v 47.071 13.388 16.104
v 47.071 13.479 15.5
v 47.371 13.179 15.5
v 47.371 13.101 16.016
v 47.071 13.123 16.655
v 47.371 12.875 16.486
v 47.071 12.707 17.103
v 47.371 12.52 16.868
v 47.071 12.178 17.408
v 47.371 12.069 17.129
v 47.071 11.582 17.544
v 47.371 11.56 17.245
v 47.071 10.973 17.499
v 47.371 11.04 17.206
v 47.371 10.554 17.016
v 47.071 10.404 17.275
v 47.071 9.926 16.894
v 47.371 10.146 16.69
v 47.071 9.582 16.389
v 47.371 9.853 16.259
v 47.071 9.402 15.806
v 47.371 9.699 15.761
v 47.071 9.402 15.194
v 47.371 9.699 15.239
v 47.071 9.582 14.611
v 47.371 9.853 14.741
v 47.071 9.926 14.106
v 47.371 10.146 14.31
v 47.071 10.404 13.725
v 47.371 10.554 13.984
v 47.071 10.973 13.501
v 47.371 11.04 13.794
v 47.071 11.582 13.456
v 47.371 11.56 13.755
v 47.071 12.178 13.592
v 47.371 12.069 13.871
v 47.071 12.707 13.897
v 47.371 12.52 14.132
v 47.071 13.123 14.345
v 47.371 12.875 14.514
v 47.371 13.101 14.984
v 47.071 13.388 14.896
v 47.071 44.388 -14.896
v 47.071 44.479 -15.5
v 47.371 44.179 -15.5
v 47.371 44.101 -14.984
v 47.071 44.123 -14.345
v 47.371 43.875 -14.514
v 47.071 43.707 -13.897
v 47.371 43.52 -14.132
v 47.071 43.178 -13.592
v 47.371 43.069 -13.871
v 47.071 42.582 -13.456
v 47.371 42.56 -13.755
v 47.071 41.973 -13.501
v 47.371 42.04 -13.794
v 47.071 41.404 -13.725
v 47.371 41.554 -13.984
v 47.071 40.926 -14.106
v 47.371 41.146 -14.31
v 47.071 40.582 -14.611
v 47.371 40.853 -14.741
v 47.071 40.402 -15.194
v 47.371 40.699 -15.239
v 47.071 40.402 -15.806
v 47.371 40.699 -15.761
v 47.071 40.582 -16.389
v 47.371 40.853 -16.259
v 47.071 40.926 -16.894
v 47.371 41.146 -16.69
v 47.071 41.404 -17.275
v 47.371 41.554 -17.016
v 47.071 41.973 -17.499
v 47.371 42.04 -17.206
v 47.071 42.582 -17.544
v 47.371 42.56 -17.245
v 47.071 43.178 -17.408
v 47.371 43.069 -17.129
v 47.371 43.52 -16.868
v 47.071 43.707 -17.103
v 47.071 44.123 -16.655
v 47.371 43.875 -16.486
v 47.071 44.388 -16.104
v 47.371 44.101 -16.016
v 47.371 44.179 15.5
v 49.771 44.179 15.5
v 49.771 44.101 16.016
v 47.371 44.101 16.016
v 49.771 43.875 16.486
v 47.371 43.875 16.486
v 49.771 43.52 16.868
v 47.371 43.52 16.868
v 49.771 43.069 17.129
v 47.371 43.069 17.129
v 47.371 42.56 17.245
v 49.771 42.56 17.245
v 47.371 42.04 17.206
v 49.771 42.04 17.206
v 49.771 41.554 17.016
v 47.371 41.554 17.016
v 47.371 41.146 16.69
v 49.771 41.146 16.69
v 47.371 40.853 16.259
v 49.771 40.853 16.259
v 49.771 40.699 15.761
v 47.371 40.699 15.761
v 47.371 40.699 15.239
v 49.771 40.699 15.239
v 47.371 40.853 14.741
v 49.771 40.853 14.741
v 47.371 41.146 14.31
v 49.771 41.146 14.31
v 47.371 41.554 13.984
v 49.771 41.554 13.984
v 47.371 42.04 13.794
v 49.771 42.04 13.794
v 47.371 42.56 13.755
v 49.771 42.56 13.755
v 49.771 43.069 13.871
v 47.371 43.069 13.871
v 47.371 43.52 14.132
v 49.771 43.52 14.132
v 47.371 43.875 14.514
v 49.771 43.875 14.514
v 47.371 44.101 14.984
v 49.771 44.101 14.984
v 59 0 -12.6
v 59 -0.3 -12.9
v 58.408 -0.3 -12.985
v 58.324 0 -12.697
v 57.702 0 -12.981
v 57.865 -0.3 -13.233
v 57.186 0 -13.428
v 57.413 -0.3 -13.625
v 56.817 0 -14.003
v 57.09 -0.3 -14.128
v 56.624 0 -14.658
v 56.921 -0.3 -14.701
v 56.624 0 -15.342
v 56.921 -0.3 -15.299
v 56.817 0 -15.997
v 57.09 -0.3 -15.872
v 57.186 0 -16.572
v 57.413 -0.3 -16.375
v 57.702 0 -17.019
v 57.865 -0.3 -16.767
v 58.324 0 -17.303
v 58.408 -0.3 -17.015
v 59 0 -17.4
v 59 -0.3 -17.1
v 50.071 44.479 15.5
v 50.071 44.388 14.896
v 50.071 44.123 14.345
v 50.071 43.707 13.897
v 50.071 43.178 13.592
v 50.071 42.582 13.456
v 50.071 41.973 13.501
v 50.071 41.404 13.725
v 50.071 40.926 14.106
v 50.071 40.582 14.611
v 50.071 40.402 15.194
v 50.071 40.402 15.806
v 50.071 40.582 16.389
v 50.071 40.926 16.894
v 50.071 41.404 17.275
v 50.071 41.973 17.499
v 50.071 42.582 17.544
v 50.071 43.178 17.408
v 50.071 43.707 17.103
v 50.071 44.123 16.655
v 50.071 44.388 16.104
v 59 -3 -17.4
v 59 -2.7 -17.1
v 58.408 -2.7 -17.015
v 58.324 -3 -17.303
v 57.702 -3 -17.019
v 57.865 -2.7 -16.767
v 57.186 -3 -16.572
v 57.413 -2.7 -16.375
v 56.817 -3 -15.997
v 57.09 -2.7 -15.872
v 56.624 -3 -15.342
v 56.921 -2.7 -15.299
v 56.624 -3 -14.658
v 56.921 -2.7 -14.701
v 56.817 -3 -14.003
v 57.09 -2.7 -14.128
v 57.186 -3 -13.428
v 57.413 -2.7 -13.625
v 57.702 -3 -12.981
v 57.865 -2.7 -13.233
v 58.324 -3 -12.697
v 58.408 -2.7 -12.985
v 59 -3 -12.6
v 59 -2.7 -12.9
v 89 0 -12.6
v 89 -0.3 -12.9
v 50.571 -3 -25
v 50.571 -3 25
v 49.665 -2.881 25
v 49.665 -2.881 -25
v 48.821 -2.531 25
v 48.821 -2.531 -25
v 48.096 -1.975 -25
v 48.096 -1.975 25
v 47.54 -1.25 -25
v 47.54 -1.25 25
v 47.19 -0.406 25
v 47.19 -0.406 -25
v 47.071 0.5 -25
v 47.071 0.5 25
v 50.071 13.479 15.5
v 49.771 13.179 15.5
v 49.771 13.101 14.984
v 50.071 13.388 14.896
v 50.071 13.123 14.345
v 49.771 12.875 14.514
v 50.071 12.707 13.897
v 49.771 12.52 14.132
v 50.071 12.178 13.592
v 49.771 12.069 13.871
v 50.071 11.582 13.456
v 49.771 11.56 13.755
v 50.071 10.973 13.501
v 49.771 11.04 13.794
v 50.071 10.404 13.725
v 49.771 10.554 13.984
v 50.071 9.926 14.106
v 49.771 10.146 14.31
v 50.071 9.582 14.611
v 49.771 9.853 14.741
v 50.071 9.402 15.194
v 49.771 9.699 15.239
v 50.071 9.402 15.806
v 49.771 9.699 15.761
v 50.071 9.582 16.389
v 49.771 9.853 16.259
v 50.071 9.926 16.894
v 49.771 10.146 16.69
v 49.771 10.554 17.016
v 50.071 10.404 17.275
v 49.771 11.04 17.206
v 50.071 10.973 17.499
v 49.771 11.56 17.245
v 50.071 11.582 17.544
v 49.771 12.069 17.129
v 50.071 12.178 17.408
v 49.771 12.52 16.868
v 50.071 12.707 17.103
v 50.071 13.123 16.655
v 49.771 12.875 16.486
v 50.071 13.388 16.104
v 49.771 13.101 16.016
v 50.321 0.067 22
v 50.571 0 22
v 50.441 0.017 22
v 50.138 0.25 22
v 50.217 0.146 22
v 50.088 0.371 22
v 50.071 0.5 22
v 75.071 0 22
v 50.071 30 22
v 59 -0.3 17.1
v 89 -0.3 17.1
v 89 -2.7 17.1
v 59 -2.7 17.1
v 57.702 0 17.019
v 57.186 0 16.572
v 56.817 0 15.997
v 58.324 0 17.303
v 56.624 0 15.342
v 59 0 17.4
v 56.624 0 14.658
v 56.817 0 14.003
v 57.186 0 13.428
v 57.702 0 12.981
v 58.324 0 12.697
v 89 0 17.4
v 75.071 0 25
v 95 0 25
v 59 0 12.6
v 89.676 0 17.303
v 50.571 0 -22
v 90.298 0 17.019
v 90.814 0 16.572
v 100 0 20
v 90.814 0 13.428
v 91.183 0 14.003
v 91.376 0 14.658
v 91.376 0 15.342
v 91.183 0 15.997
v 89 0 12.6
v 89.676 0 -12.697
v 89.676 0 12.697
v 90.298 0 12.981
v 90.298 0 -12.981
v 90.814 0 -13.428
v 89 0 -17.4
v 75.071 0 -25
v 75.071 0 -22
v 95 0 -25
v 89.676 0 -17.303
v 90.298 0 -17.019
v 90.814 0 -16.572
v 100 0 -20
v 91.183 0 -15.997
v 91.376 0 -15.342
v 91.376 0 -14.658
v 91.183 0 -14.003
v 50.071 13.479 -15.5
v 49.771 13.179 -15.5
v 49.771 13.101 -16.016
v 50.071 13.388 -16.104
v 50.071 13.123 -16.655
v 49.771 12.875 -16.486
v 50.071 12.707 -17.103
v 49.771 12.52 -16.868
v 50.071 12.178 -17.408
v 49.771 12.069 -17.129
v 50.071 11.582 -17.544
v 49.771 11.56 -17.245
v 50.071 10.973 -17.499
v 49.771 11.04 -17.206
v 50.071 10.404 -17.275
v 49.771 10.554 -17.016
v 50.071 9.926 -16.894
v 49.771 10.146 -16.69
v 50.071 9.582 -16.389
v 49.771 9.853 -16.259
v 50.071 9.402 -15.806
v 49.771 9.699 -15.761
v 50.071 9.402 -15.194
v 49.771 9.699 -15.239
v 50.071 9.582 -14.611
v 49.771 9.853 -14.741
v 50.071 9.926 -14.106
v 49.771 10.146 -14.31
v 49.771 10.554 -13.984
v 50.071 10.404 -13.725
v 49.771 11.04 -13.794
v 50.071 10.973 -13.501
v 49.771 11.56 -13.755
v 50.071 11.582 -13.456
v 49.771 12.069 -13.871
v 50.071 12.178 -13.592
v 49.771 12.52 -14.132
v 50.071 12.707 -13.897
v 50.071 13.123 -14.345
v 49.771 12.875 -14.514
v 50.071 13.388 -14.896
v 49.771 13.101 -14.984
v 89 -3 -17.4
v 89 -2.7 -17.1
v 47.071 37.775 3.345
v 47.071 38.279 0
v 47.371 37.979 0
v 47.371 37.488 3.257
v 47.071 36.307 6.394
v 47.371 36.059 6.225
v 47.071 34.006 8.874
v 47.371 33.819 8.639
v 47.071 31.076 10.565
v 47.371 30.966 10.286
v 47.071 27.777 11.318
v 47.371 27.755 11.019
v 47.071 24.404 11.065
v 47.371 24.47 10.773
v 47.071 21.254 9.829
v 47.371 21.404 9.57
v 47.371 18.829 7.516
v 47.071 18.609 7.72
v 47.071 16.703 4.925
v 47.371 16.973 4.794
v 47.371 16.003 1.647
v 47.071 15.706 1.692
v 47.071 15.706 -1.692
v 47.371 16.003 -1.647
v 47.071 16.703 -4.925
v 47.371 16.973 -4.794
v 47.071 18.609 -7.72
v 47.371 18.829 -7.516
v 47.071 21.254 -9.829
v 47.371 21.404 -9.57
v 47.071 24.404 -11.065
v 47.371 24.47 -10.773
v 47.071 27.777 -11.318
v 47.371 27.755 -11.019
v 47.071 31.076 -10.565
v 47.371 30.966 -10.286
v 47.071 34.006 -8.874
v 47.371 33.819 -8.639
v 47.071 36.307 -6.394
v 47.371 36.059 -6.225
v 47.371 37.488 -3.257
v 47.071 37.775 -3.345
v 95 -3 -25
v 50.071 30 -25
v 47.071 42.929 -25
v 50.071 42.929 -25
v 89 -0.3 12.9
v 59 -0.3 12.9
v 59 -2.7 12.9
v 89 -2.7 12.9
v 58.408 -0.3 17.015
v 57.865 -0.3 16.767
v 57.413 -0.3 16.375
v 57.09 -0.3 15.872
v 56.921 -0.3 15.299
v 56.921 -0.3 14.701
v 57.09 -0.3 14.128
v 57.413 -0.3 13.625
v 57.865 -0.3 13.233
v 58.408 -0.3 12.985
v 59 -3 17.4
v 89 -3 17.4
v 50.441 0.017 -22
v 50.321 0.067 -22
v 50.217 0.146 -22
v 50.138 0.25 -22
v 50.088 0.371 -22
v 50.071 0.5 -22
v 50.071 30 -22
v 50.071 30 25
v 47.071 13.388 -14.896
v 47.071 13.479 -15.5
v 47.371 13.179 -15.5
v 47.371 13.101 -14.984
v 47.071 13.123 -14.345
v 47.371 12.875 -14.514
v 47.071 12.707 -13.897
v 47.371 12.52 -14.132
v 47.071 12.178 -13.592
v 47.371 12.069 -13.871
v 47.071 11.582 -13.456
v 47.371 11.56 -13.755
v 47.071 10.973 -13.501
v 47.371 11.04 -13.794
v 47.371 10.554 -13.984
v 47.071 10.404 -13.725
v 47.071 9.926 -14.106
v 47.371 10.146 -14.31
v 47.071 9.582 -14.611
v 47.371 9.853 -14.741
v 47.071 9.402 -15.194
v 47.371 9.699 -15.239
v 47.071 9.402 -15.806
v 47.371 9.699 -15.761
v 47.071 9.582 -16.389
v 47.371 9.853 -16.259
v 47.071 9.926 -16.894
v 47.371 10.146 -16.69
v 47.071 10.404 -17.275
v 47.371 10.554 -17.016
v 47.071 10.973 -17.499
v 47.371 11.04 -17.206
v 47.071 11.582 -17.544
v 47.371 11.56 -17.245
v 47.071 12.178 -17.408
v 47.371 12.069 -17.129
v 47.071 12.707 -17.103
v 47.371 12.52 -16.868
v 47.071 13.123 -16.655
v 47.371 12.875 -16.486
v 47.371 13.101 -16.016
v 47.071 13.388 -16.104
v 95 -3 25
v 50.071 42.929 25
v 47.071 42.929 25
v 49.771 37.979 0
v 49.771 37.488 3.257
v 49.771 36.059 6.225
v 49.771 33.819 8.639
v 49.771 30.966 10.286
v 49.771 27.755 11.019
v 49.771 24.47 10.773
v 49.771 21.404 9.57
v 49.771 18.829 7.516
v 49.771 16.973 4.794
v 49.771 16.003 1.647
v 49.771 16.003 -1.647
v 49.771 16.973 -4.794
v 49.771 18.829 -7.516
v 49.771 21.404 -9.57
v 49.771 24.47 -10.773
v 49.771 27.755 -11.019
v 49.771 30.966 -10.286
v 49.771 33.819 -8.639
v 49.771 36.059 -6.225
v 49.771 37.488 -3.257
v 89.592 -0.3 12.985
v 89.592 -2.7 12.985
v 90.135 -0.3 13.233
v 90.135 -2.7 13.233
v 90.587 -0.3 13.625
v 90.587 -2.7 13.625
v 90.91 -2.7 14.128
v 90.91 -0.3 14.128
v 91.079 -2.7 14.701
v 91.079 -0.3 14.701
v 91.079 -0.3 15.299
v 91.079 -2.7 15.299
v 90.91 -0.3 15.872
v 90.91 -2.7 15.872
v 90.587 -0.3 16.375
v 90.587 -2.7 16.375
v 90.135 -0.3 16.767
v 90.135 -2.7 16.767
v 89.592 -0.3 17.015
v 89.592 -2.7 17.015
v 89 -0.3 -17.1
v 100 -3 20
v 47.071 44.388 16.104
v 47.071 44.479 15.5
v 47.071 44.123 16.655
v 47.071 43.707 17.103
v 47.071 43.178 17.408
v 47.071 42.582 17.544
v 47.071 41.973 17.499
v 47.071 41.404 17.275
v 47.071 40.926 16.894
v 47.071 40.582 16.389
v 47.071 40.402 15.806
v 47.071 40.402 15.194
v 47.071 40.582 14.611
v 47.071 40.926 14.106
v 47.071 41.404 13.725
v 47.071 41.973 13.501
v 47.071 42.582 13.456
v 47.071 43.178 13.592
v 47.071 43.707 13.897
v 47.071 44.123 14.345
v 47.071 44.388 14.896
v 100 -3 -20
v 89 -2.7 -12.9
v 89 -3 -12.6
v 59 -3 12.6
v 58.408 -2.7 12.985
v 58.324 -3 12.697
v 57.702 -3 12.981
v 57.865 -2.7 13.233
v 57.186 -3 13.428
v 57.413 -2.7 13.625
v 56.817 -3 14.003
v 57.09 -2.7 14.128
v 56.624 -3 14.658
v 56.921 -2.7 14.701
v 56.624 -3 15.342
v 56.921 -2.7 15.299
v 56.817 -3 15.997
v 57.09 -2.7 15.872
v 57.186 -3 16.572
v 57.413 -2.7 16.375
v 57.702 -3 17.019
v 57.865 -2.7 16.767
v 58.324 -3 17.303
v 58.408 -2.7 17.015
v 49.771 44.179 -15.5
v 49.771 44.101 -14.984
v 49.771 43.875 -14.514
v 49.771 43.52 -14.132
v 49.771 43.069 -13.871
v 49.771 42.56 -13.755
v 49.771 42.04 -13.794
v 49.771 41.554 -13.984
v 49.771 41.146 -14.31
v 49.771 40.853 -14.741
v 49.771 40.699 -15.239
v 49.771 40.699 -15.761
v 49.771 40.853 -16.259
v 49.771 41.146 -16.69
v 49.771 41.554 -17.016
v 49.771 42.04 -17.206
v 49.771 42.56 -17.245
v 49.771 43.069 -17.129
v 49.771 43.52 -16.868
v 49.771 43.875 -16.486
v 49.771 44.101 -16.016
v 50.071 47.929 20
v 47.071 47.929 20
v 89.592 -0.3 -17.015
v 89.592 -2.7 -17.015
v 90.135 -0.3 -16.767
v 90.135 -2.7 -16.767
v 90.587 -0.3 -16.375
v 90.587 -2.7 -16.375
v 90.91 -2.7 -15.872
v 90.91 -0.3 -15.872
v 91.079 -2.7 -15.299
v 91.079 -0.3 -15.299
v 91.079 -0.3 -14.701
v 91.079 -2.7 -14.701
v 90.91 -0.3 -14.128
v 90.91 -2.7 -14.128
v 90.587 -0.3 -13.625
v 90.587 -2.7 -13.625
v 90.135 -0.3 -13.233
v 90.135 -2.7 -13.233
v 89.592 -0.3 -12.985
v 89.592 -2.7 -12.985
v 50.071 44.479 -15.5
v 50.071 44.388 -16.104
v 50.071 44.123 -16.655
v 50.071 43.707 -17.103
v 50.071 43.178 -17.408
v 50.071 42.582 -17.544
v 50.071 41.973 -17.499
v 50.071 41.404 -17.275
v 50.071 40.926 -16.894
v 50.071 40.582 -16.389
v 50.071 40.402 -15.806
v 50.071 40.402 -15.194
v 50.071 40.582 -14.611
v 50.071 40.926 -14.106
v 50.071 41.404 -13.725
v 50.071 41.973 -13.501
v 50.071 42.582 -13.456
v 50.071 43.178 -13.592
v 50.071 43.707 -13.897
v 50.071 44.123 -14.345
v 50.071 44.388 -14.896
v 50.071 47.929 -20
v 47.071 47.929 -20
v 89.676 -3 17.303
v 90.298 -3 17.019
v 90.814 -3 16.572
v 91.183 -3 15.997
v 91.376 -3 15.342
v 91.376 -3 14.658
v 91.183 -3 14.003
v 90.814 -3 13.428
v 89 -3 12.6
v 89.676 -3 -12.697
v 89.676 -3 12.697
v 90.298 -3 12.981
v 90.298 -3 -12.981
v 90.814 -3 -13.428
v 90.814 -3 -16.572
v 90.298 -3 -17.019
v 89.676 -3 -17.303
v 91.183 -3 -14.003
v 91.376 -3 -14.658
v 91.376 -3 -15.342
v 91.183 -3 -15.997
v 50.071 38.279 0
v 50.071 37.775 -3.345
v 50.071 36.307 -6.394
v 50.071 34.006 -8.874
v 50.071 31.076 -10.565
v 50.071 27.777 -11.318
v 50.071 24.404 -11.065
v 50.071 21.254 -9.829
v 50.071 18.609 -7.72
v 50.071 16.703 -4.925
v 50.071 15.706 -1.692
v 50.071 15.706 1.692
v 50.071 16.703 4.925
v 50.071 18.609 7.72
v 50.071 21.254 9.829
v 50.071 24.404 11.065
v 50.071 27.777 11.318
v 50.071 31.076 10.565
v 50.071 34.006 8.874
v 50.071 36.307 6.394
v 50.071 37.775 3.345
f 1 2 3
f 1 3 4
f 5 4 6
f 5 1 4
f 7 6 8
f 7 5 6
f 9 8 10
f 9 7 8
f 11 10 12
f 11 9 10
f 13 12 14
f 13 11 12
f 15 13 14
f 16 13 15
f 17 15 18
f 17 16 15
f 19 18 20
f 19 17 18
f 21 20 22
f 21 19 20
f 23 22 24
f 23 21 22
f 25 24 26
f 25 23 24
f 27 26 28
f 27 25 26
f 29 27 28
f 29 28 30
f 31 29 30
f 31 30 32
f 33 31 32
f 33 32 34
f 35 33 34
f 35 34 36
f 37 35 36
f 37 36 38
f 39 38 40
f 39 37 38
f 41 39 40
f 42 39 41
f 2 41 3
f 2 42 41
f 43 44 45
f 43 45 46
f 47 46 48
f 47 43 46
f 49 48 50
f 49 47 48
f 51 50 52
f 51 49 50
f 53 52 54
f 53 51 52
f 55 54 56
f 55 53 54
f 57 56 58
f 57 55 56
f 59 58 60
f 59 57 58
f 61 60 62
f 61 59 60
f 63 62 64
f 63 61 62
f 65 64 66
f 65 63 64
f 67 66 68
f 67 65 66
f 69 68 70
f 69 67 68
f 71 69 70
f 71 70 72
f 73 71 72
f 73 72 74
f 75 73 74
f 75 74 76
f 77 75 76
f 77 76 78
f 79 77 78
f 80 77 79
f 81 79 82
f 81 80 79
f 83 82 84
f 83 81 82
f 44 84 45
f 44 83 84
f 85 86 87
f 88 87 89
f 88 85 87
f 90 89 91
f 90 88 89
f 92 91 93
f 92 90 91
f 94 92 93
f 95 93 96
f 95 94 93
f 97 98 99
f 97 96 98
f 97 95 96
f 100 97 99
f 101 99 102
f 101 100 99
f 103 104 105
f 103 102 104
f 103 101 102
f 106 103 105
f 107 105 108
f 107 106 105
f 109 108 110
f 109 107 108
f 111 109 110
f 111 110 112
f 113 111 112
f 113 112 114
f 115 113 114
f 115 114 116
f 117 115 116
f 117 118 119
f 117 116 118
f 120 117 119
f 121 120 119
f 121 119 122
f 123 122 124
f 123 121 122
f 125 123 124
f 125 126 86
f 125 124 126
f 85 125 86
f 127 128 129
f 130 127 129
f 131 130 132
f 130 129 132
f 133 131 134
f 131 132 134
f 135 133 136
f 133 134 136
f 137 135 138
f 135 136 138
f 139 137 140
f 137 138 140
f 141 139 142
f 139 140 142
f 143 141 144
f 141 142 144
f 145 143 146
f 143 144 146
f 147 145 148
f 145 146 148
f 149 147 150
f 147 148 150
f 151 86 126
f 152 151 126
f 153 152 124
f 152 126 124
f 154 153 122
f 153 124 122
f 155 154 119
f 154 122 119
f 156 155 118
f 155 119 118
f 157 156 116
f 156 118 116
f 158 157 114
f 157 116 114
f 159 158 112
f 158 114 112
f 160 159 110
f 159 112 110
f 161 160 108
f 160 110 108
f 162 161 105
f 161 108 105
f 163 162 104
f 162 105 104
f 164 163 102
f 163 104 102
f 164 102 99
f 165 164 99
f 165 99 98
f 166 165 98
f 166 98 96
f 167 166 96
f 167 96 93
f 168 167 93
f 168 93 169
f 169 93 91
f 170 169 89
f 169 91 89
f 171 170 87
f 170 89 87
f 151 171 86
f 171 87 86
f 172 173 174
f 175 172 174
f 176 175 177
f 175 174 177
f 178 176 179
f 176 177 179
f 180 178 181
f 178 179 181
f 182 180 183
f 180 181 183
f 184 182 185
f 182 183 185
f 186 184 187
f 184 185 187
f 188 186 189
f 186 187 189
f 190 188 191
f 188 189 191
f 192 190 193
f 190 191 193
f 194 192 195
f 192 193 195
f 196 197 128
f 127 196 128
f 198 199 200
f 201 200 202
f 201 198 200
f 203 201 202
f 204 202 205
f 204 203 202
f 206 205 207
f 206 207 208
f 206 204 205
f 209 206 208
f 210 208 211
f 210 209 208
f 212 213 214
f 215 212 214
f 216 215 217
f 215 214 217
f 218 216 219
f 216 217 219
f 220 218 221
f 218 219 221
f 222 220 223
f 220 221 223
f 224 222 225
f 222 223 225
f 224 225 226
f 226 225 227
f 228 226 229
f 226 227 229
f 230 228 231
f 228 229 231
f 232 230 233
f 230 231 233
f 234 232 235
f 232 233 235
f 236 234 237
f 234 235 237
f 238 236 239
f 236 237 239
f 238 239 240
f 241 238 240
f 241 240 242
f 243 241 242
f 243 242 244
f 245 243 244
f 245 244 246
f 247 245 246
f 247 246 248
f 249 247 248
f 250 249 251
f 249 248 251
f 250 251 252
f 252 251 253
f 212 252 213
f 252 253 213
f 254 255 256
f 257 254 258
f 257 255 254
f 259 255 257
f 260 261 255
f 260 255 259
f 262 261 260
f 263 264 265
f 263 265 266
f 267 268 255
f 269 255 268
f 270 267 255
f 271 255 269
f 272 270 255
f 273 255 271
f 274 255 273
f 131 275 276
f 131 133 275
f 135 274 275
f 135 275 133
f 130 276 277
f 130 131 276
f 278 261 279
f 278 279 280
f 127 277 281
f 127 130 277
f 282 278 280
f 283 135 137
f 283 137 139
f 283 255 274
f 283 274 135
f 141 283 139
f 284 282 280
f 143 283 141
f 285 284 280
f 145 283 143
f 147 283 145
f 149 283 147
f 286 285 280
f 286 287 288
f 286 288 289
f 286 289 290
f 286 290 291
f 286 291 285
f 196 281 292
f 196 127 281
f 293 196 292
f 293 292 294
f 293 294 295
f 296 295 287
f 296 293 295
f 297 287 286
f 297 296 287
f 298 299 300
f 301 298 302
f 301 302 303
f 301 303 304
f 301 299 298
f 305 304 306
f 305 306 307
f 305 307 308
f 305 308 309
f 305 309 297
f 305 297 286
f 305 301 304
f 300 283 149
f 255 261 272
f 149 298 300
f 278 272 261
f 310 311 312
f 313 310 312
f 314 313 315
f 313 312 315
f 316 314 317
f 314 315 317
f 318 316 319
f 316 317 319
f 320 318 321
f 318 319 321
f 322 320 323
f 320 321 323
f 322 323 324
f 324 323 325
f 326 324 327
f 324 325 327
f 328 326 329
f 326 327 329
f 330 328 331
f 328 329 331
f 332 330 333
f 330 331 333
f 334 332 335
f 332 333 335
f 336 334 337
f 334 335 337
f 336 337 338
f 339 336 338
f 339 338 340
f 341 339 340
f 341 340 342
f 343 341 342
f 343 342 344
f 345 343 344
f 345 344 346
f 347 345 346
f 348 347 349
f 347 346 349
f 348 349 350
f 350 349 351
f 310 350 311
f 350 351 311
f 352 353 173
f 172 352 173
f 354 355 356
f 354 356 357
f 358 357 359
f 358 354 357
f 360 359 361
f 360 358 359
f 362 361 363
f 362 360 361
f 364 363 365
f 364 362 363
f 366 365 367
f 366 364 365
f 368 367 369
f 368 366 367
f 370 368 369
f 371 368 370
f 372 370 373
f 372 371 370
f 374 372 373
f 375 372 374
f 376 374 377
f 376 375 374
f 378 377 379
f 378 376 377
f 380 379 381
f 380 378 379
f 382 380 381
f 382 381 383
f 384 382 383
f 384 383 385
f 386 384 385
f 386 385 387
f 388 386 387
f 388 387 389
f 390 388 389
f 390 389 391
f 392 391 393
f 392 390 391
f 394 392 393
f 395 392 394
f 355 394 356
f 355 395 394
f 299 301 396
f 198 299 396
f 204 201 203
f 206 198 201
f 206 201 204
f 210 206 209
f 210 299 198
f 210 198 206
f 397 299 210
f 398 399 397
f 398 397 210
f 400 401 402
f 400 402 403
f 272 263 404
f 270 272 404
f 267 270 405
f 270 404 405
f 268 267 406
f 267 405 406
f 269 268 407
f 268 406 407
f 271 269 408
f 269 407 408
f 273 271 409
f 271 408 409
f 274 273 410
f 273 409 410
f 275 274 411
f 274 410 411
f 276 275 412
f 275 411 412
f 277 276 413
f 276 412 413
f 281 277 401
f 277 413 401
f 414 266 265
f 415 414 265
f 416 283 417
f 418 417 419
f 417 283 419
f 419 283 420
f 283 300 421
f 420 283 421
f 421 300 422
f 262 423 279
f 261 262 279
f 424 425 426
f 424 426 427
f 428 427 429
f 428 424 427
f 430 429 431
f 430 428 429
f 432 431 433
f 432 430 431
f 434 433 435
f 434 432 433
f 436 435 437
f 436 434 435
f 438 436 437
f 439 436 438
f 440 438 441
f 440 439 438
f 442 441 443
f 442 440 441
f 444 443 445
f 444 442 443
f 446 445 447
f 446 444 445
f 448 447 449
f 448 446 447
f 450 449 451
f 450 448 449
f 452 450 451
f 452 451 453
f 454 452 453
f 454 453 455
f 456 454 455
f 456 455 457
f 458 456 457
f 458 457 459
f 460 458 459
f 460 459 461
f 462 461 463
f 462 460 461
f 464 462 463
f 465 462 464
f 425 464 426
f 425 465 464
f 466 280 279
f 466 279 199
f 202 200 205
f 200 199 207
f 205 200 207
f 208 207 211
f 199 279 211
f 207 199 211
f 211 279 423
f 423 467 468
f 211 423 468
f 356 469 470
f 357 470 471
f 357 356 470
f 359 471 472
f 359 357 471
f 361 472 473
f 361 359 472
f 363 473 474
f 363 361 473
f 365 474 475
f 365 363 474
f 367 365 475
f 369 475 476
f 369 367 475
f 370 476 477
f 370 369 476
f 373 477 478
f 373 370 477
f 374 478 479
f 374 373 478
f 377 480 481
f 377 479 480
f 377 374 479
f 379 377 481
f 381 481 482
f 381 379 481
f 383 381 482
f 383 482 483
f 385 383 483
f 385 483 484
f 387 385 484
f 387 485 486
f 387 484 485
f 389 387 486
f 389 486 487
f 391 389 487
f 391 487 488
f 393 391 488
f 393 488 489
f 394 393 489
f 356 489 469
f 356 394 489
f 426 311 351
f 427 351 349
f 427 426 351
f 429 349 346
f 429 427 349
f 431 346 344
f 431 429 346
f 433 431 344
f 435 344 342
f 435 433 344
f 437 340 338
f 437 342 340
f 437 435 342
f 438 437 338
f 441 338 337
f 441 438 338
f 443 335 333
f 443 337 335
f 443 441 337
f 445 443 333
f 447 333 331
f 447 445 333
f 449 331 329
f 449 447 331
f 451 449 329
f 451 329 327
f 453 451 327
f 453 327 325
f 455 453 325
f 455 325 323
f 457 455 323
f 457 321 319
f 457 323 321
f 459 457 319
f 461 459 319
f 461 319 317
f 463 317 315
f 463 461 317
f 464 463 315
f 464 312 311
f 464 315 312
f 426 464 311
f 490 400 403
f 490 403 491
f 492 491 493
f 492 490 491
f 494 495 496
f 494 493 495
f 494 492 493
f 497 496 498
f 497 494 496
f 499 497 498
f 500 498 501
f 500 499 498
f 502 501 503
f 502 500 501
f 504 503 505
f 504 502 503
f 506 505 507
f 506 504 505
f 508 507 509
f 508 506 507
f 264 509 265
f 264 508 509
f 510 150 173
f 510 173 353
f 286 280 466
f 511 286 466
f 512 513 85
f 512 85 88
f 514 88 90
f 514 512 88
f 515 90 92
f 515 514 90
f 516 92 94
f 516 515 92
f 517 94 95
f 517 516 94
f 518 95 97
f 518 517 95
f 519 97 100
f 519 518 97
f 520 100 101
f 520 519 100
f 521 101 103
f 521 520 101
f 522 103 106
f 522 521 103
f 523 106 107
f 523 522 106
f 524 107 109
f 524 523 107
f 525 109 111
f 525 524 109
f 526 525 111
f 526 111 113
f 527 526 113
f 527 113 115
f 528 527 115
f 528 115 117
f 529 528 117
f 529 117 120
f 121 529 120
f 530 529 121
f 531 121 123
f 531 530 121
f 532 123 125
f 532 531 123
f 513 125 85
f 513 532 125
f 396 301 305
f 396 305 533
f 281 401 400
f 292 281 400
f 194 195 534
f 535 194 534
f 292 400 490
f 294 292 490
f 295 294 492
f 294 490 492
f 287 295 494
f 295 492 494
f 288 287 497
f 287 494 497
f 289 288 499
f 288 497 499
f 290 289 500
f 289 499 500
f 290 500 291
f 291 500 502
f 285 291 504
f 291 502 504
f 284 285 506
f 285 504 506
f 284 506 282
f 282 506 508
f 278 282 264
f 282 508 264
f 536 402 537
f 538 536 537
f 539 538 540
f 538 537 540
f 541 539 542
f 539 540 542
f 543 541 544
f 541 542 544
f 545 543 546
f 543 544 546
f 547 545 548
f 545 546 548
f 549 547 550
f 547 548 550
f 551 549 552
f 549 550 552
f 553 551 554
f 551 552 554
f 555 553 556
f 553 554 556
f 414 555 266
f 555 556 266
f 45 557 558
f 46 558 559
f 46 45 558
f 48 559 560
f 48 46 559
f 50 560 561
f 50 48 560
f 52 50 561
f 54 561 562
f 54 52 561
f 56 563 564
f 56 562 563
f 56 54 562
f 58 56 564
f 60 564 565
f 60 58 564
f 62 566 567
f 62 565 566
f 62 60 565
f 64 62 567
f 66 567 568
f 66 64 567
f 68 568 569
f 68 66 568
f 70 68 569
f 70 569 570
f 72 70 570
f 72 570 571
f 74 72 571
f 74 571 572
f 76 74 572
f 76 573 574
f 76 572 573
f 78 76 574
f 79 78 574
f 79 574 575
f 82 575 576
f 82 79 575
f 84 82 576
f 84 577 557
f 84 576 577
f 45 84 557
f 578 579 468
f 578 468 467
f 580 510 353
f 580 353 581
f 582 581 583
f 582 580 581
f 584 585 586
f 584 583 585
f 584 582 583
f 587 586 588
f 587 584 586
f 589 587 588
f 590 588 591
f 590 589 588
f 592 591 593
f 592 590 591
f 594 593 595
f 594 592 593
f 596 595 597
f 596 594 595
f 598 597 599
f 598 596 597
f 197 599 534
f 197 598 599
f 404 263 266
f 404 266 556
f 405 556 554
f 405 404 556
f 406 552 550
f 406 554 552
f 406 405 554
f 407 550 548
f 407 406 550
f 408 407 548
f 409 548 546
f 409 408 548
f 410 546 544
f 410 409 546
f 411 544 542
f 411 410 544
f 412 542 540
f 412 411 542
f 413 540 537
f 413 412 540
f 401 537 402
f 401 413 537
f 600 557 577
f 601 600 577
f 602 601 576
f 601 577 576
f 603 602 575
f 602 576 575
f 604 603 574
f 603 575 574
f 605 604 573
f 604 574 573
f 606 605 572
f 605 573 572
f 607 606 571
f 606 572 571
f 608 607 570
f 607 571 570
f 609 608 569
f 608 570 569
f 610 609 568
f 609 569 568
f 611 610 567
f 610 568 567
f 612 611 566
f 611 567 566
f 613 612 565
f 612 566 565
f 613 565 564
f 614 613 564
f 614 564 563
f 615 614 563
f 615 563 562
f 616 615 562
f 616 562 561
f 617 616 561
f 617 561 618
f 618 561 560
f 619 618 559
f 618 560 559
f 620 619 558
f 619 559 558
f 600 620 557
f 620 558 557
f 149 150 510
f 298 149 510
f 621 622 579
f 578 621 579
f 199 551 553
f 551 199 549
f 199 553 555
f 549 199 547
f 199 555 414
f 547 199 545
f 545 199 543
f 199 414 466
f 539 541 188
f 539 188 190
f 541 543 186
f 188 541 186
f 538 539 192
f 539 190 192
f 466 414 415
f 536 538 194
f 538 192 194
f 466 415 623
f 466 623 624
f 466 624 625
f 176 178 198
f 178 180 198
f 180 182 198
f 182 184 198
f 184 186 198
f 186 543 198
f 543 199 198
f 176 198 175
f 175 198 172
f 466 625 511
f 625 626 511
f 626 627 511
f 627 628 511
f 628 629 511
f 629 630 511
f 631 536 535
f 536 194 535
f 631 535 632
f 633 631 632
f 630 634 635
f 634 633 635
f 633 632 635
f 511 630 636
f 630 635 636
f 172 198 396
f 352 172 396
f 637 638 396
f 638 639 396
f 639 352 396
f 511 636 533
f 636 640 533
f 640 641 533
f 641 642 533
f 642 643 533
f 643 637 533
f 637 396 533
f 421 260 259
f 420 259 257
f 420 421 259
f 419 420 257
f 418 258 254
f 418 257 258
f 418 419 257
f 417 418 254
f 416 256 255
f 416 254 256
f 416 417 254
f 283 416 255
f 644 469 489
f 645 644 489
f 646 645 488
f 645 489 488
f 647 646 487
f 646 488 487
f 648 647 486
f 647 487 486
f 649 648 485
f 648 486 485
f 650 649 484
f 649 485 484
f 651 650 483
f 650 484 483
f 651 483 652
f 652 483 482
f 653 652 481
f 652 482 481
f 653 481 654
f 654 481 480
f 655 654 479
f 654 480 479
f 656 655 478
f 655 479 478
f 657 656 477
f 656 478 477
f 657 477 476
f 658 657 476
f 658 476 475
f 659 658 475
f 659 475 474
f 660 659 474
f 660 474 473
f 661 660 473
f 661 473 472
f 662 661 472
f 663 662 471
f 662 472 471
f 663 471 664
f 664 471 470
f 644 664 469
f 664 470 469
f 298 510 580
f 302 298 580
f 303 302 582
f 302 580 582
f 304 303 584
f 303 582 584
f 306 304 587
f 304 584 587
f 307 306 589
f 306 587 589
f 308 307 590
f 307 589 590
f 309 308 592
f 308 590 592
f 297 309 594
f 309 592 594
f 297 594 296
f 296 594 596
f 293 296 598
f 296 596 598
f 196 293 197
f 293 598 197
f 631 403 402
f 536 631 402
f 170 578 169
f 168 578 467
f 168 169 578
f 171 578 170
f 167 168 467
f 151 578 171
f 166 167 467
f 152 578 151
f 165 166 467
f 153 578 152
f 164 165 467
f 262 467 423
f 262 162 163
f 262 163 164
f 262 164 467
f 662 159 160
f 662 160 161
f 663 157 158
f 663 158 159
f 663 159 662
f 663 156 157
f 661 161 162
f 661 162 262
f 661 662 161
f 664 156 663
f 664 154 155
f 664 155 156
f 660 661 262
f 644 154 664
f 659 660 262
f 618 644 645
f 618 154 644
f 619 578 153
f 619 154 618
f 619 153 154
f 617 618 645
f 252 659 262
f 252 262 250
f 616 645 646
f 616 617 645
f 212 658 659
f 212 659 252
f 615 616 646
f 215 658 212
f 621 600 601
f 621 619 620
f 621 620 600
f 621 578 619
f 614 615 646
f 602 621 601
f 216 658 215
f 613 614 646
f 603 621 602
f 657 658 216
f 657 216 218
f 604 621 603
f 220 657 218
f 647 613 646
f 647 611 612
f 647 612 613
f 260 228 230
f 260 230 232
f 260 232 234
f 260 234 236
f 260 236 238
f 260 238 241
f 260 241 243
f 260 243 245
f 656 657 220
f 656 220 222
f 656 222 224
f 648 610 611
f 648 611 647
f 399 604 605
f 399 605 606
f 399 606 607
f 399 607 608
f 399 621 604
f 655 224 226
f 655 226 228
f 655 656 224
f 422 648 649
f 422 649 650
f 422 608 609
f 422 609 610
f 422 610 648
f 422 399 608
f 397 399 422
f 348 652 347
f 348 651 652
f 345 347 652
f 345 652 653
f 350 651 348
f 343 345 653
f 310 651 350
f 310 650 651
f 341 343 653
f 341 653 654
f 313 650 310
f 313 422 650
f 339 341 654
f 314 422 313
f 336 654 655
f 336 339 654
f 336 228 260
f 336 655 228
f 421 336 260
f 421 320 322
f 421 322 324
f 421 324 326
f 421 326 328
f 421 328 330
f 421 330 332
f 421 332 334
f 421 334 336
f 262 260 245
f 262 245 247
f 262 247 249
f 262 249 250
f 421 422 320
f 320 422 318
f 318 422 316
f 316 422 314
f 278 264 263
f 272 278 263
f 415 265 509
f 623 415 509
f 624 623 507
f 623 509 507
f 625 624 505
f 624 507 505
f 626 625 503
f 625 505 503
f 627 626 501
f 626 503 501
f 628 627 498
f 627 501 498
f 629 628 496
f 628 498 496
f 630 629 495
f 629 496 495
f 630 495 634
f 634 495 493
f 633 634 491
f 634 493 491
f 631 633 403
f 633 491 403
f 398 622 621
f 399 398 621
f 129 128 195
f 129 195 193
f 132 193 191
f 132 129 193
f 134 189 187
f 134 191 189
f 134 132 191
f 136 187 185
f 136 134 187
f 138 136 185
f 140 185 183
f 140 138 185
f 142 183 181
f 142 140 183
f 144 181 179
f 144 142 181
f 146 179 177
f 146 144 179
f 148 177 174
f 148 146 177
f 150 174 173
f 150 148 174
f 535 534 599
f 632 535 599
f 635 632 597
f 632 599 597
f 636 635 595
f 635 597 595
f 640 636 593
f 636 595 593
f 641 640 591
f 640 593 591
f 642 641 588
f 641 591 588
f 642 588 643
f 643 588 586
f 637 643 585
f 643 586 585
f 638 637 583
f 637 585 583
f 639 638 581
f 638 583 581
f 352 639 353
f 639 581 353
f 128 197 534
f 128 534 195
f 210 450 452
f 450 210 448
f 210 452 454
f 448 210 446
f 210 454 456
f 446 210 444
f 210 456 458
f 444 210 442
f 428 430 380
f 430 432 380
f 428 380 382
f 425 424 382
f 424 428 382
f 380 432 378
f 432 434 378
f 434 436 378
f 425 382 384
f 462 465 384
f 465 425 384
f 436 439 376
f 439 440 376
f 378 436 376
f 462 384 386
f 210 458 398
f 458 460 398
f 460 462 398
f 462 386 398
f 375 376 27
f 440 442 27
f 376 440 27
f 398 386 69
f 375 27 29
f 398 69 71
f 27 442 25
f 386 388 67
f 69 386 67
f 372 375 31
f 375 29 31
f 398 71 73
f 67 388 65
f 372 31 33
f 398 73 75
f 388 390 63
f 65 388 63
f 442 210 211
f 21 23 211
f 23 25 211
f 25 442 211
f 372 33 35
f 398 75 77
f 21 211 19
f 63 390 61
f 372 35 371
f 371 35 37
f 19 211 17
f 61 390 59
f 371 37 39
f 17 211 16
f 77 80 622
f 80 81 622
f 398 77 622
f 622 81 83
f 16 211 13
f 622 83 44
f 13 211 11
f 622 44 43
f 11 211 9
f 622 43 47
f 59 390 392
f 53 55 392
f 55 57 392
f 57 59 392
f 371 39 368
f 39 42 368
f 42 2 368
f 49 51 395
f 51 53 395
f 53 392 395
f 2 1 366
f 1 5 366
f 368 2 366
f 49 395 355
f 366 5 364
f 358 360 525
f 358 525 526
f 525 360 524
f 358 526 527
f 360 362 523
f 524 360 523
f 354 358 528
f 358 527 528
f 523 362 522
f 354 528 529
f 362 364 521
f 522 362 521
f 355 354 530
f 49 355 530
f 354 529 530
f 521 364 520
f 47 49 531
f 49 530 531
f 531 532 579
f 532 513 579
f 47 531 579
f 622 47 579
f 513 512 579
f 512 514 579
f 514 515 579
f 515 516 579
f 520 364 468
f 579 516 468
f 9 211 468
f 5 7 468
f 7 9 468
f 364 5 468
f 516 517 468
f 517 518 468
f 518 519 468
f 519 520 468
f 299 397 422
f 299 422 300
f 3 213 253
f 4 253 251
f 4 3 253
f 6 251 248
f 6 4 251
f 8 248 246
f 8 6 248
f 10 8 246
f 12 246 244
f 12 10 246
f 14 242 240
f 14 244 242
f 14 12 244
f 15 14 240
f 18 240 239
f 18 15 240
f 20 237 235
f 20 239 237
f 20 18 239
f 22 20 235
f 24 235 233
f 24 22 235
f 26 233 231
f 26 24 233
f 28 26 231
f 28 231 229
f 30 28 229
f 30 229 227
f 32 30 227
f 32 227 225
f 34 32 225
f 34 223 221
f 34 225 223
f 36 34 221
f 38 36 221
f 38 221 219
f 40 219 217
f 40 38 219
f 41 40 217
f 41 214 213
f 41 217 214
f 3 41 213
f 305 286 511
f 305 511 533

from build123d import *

# Parameters (mm, degrees)
SKETCH1_W                    = 100
SKETCH1_H                    = 50
BASE_FLANGE1_DEPTH           = 3
SKETCH2_R                    = 11.05
SKETCH2_R_2                  = 1.75
CUT_EXTRUDE1_DEPTH           = 104.121287812
CUT_EXTRUDE3_DEPTH           = 104.121287812
SKETCHED_BEND2_OUTLINE_W     = 3
SKETCHED_BEND2_OUTLINE_H     = 50
SKETCHED_BEND2_DEPTH         = 47.070796327
SKETCHED_START               = 47.411206327
SKETCHED_BEND2_2_OUTLINE_W   = 47.929203673
SKETCHED_BEND2_2_OUTLINE_H   = 50
SKETCHED_BEND2_2_OUTLINE_R   = 1.75
SKETCHED_BEND2_2_OUTLINE_R_2 = 11.05
SKETCHED_BEND2_2_DEPTH       = 2.65959
SKETCHED_START_2             = 47.070796327
SKETCHED_BEND2_3_OUTLINE_W   = 47.929203673
SKETCHED_BEND2_3_OUTLINE_H   = 50
SKETCHED_BEND2_3_OUTLINE_R   = 1.75
SKETCHED_BEND2_3_OUTLINE_R_2 = 11.05
SKETCHED_BEND2_3_DEPTH       = 3.5
SKETCHED_START_3             = -26
SKETCHED_BEND2_4_DEPTH       = 52
BOSS_EXTRUDE1_DEPTH          = 3
CHAMFER1_SIZE                = 5
CHAMFER2_SIZE                = 0.3


with BuildPart() as part:
    # Base-Flange1: sheet metal written as solids
    # Sketch1 → Base-Flange1 (new body)
    with BuildSketch(Plane(origin=(0, 0, 0), x_dir=(1, 0, 0), z_dir=(0, 1, 0))):
        with Locations((50, 0)):
            Rectangle(SKETCH1_W, SKETCH1_H)
    extrude(amount=-BASE_FLANGE1_DEPTH)

    # Sketch2 → Cut-Extrude1 (cut, through all)
    with BuildSketch(Plane(origin=(0, 0, 0), x_dir=(1, 0, 0), z_dir=(0, 1, 0))):
        with Locations(Location((21, 0, 0), (0, 0, 270))):
            Circle(SKETCH2_R)
        with Locations(Location((5.5, 15.5, 0), (0, 0, 270))):
            Circle(SKETCH2_R_2)
        with Locations(Location((36.5, 15.5, 0), (0, 0, 270))):
            Circle(SKETCH2_R_2)
        with Locations(Location((36.5, -15.5, 0), (0, 0, 270))):
            Circle(SKETCH2_R_2)
        with Locations(Location((5.5, -15.5, 0), (0, 0, 270))):
            Circle(SKETCH2_R_2)
    extrude(amount=-CUT_EXTRUDE1_DEPTH, mode=Mode.SUBTRACT)

    # Sketch4 → Cut-Extrude3 (cut, through all)
    with BuildSketch(Plane(origin=(0, 0, 0), x_dir=(1, 0, 0), z_dir=(0, 1, 0))):
        with BuildLine():
            Line((59, 17.1), (89, 17.1))
            ThreePointArc((89, 17.1), (91.1, 15), (89, 12.9))
            Line((89, 12.9), (59, 12.9))
            ThreePointArc((59, 12.9), (56.9, 15), (59, 17.1))
        make_face()
        with BuildLine():
            Line((59, -12.9), (89, -12.9))
            ThreePointArc((89, -12.9), (91.1, -15), (89, -17.1))
            Line((89, -17.1), (59, -17.1))
            ThreePointArc((59, -17.1), (56.9, -15), (59, -12.9))
        make_face()
    extrude(amount=-CUT_EXTRUDE3_DEPTH, mode=Mode.SUBTRACT)

    # Sketched Bend2: read off the stored shape, not the designer's step
    # Sketched Bend2 outline → Sketched Bend2 (cut)
    with BuildSketch(Plane.YZ):
        with Locations((-1.5, 0)):
            Rectangle(SKETCHED_BEND2_OUTLINE_W, SKETCHED_BEND2_OUTLINE_H)
    extrude(amount=SKETCHED_BEND2_DEPTH, mode=Mode.SUBTRACT)

    # Sketched Bend2 2 outline → Sketched Bend2 2 (add)
    with BuildSketch(Plane.YZ.offset(SKETCHED_START)):
        with Locations((23.964601837, 0)):
            Rectangle(SKETCHED_BEND2_2_OUTLINE_W, SKETCHED_BEND2_2_OUTLINE_H)
        with Locations((11.429203673, -15.5)):
            Circle(SKETCHED_BEND2_2_OUTLINE_R, mode=Mode.SUBTRACT)
        with Locations((42.429203673, -15.5)):
            Circle(SKETCHED_BEND2_2_OUTLINE_R, mode=Mode.SUBTRACT)
        with Locations((11.429203673, 15.5)):
            Circle(SKETCHED_BEND2_2_OUTLINE_R, mode=Mode.SUBTRACT)
        with Locations((26.929203673, 0)):
            Circle(SKETCHED_BEND2_2_OUTLINE_R_2, mode=Mode.SUBTRACT)
        with Locations((42.429203673, 15.5)):
            Circle(SKETCHED_BEND2_2_OUTLINE_R, mode=Mode.SUBTRACT)
    extrude(amount=SKETCHED_BEND2_2_DEPTH)

    # Sketched Bend2 3 outline → Sketched Bend2 3 (add)
    with BuildSketch(Plane.YZ.offset(SKETCHED_START_2)):
        with Locations((23.964601837, 0)):
            Rectangle(SKETCHED_BEND2_3_OUTLINE_W, SKETCHED_BEND2_3_OUTLINE_H)
        with Locations((11.429203673, -15.5)):
            Circle(SKETCHED_BEND2_3_OUTLINE_R, mode=Mode.SUBTRACT)
        with Locations((42.429203673, -15.5)):
            Circle(SKETCHED_BEND2_3_OUTLINE_R, mode=Mode.SUBTRACT)
        with Locations((11.429203673, 15.5)):
            Circle(SKETCHED_BEND2_3_OUTLINE_R, mode=Mode.SUBTRACT)
        with Locations((26.929203673, 0)):
            Circle(SKETCHED_BEND2_3_OUTLINE_R_2, mode=Mode.SUBTRACT)
        with Locations((42.429203673, 15.5)):
            Circle(SKETCHED_BEND2_3_OUTLINE_R, mode=Mode.SUBTRACT)
    extrude(amount=SKETCHED_BEND2_3_DEPTH)

    # Sketched Bend2 4 outline → Sketched Bend2 4 (cut)
    with BuildSketch(Plane.XY.offset(SKETCHED_START_3)):
        with BuildLine():
            Line((50.570796327, 47.929203673), (50.070796327, 47.929203673))
            Line((50.070796327, 47.929203673), (50.070796327, 0.5))
            ThreePointArc((50.070796327, 0.5), (50.217242936, 0.146446609), (50.570796327, 0))
            Line((50.570796327, 0), (50.570796327, 47.929203673))
        make_face()
        with BuildLine():
            ThreePointArc((50.570796327, -3), (48.095922593, -1.974873734), (47.070796327, 0.5))
            Line((47.070796327, 0.5), (47.070796327, -3))
            Line((47.070796327, -3), (50.570796327, -3))
        make_face()
    extrude(amount=SKETCHED_BEND2_4_DEPTH, mode=Mode.SUBTRACT)

    # Sketch6 → Boss-Extrude1 (add)
    with BuildSketch(Plane.XY.offset(25)):
        Polygon((50.070796327, 30), (75.070796327, 0), (50.070796327, 0), align=None)
    boss_extrude1 = extrude(amount=-BOSS_EXTRUDE1_DEPTH)

    # Mirror1: Boss-Extrude1 across plane
    add(boss_extrude1.mirror(Plane.XY))

    # Chamfer1
    chamfer1_edges = [part.edges().sort_by_distance(p)[0] for p in [
        (48.570796327, 47.929203673, -25),
        (48.570796327, 47.929203673, 25),
        (100, -1.5, -25),
        (100, -1.5, 25),
    ]]
    chamfer(chamfer1_edges, length=CHAMFER1_SIZE)

    # Chamfer2
    chamfer2_edges = [part.edges().sort_by_distance(p)[0] for p in [
        (47.070796327, 15.879203673, 0),
        (50.070796327, 15.879203673, 0),
        (47.070796327, 40.679203673, -15.5),
        (50.070796327, 40.679203673, -15.5),
        (47.070796327, 9.679203673, -15.5),
        (50.070796327, 9.679203673, -15.5),
        (47.070796327, 9.679203673, 15.5),
        (50.070796327, 9.679203673, 15.5),
        (47.070796327, 40.679203673, 15.5),
        (50.070796327, 40.679203673, 15.5),
        (74, 0, -17.1),
        (91.1, 0, -15),
        (74, 0, -12.9),
        (56.9, 0, -15),
        (74, 0, 12.9),
        (91.1, 0, 15),
        (74, 0, 17.1),
        (56.9, 0, 15),
        (56.9, -3, 15),
        (74, -3, 17.1),
        (91.1, -3, 15),
        (74, -3, 12.9),
        (56.9, -3, -15),
        (74, -3, -12.9),
        (91.1, -3, -15),
        (74, -3, -17.1),
    ]]
    chamfer(chamfer2_edges, length=CHAMFER2_SIZE)


solid = part.part
